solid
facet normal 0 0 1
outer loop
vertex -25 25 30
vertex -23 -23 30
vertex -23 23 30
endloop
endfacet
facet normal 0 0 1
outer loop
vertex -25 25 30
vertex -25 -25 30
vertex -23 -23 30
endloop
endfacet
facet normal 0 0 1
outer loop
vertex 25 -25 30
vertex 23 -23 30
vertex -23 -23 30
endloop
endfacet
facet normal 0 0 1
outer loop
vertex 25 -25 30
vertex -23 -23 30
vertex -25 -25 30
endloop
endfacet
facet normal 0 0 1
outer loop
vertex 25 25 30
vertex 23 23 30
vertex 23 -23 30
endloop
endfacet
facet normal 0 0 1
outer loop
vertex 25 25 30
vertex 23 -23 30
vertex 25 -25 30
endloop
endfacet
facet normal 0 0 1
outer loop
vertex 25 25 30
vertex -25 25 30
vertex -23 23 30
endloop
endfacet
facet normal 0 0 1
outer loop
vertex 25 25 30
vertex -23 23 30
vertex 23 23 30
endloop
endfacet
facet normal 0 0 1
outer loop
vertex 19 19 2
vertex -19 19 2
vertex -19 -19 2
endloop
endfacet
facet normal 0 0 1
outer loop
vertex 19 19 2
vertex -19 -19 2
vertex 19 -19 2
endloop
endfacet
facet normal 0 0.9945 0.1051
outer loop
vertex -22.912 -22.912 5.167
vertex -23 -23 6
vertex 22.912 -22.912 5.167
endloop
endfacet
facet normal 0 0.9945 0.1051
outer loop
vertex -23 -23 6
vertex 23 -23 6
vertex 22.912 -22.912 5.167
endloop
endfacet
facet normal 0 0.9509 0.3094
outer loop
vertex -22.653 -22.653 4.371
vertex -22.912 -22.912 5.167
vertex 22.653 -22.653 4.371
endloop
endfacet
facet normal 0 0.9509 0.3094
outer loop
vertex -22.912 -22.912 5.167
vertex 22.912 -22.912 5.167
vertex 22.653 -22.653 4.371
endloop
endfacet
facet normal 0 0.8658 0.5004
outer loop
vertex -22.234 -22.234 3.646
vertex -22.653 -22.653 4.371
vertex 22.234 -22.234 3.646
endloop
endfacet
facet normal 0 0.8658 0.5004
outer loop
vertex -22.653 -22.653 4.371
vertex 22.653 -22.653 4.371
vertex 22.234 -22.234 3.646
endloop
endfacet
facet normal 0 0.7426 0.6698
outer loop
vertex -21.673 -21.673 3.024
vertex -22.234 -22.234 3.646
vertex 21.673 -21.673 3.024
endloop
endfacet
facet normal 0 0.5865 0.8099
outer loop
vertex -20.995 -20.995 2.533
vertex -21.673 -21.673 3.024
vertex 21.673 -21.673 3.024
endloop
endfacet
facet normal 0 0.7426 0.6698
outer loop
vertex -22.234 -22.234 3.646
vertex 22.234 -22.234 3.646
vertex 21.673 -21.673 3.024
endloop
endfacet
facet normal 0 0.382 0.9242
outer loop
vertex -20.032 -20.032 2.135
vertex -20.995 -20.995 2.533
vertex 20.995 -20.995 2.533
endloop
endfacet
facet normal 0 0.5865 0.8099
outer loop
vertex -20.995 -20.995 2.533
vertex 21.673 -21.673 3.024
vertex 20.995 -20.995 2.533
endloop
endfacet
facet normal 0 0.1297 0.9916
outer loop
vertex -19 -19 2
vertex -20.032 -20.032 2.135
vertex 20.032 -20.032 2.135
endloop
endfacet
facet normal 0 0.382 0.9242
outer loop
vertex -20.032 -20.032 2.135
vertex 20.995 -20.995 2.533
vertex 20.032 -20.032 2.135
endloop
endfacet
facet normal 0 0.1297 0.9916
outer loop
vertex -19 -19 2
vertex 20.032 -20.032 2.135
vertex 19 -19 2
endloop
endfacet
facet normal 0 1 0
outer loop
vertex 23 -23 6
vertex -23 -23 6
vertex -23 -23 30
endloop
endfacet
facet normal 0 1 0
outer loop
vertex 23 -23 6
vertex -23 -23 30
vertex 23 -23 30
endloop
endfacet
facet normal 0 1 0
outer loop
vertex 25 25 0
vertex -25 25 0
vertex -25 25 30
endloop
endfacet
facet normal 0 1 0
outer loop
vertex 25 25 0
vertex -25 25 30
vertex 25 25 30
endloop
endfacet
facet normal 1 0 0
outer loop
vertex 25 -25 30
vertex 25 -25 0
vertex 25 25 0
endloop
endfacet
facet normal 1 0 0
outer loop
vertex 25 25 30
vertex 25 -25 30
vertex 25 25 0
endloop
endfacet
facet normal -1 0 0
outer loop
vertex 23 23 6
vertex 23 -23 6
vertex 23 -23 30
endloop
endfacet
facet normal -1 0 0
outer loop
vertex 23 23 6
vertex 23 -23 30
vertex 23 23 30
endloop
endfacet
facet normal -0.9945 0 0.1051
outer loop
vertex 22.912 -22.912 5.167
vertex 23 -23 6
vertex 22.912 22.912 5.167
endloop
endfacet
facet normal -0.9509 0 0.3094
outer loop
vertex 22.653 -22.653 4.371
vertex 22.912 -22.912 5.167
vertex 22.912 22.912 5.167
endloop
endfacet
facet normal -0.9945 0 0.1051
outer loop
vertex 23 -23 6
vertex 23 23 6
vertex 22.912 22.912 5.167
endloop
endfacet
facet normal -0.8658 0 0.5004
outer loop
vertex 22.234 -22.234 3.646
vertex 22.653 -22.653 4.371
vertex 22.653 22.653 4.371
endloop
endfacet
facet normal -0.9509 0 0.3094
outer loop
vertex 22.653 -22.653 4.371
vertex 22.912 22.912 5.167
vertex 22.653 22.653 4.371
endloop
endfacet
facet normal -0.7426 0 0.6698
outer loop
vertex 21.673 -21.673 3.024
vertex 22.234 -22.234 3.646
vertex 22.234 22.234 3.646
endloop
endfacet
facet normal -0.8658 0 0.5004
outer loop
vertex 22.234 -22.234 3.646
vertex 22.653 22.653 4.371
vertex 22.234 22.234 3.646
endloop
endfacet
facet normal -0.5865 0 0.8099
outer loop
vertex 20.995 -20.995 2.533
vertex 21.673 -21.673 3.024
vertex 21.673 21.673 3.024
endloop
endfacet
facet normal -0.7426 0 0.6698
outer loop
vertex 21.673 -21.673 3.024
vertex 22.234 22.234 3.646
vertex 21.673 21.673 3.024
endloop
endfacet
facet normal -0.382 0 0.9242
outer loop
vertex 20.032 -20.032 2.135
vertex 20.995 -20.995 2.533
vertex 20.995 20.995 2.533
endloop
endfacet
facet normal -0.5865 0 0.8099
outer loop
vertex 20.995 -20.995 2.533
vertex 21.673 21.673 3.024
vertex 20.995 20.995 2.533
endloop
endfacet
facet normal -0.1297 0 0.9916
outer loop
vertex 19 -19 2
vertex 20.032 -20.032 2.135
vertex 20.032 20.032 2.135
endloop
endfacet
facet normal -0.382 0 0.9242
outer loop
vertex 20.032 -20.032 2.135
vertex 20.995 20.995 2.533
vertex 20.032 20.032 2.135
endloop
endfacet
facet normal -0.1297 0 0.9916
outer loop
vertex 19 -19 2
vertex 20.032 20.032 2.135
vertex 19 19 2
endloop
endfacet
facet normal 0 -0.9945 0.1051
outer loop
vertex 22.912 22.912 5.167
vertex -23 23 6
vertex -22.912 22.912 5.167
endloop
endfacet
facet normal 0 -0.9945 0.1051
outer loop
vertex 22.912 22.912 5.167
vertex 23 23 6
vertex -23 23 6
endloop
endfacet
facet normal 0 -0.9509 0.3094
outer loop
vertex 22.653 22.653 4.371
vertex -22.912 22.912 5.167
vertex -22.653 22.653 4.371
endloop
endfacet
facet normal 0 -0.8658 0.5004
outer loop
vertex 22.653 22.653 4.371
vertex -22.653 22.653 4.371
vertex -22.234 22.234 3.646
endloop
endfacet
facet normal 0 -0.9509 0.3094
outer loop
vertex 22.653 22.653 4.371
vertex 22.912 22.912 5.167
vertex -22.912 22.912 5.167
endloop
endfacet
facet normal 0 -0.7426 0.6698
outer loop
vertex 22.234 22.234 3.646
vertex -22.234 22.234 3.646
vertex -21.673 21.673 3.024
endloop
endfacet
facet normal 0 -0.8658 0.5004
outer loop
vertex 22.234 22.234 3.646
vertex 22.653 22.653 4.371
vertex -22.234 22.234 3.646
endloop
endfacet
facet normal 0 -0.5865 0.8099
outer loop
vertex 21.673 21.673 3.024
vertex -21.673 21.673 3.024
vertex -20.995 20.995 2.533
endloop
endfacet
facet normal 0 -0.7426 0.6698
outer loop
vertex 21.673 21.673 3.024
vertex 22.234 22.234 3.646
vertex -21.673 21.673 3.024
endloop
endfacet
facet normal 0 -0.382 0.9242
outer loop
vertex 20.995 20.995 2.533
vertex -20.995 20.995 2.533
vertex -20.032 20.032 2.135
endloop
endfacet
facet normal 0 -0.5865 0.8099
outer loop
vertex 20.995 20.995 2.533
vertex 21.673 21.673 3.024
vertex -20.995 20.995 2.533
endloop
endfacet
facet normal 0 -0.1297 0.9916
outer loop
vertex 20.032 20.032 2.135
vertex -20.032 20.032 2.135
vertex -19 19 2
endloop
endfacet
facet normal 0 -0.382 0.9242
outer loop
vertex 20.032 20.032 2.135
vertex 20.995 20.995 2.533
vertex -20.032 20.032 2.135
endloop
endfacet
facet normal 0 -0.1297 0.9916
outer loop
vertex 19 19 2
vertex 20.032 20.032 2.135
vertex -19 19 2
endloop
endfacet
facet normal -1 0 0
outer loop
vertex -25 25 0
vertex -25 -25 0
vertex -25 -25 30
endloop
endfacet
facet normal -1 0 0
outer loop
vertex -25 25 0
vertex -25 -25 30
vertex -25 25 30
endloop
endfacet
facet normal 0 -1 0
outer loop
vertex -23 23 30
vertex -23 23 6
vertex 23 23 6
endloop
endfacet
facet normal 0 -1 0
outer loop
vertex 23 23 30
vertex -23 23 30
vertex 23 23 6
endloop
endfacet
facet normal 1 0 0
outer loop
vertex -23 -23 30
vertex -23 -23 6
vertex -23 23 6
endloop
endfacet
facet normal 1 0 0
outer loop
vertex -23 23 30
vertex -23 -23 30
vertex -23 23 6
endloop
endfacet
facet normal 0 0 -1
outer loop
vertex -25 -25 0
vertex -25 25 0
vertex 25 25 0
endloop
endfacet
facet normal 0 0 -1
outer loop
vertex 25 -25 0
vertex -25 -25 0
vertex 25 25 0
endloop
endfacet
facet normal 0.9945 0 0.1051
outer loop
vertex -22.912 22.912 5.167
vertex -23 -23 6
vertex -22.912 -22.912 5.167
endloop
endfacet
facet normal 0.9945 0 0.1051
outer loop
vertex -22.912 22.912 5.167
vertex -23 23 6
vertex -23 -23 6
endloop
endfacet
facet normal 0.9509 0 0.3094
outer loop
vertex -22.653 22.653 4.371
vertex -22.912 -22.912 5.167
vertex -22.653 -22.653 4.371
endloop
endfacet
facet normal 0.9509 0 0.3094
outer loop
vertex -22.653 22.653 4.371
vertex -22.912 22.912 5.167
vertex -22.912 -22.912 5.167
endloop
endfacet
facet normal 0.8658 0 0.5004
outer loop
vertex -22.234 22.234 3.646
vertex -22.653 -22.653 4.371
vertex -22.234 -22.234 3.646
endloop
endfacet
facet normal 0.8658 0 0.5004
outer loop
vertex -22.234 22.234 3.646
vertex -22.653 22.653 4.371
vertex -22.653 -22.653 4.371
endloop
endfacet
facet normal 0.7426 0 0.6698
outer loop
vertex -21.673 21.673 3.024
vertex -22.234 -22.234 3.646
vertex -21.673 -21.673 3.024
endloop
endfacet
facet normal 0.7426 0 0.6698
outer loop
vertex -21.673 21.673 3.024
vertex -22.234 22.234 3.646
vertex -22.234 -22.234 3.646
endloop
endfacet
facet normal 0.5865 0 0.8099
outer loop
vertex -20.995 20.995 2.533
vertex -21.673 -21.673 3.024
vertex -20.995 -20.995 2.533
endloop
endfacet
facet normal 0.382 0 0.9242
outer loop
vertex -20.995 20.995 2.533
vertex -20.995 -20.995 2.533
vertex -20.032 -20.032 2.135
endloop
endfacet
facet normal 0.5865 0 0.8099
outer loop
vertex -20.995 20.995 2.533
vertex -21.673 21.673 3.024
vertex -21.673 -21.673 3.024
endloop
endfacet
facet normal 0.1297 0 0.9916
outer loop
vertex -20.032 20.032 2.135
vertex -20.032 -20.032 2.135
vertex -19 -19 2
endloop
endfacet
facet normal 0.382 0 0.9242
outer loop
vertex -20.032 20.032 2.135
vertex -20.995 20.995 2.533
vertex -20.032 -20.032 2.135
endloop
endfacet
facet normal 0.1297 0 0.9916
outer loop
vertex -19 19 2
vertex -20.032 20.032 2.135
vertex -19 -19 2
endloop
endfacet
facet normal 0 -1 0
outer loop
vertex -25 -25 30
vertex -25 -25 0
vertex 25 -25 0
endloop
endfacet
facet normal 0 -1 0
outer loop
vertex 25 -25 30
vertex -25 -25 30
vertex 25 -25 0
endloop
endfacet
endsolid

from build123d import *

# Parameters (mm, degrees)
F2_W     = 50
F2_H     = 50
F3_DEPTH = 30
F4_T     = -2
F5_R     = 4


with BuildPart() as f3:
    # F2 (on Top) → F3 (new body)
    with BuildSketch(Plane.XY):
        Rectangle(F2_W, F2_H)
    extrude(amount=F3_DEPTH)

    # F4
    f4_openings = [f3.faces().sort_by_distance(p)[0] for p in [
        (0, 0, 30),
    ]]
    offset(amount=F4_T, openings=f4_openings)

    # F5
    f5_edges = [f3.edges().sort_by_distance(p)[0] for p in [
        (0, 23, 2),
        (-23, 0, 2),
        (23, 0, 2),
        (0, -23, 2),
    ]]
    fillet(f5_edges, radius=F5_R)


solid = f3.part
